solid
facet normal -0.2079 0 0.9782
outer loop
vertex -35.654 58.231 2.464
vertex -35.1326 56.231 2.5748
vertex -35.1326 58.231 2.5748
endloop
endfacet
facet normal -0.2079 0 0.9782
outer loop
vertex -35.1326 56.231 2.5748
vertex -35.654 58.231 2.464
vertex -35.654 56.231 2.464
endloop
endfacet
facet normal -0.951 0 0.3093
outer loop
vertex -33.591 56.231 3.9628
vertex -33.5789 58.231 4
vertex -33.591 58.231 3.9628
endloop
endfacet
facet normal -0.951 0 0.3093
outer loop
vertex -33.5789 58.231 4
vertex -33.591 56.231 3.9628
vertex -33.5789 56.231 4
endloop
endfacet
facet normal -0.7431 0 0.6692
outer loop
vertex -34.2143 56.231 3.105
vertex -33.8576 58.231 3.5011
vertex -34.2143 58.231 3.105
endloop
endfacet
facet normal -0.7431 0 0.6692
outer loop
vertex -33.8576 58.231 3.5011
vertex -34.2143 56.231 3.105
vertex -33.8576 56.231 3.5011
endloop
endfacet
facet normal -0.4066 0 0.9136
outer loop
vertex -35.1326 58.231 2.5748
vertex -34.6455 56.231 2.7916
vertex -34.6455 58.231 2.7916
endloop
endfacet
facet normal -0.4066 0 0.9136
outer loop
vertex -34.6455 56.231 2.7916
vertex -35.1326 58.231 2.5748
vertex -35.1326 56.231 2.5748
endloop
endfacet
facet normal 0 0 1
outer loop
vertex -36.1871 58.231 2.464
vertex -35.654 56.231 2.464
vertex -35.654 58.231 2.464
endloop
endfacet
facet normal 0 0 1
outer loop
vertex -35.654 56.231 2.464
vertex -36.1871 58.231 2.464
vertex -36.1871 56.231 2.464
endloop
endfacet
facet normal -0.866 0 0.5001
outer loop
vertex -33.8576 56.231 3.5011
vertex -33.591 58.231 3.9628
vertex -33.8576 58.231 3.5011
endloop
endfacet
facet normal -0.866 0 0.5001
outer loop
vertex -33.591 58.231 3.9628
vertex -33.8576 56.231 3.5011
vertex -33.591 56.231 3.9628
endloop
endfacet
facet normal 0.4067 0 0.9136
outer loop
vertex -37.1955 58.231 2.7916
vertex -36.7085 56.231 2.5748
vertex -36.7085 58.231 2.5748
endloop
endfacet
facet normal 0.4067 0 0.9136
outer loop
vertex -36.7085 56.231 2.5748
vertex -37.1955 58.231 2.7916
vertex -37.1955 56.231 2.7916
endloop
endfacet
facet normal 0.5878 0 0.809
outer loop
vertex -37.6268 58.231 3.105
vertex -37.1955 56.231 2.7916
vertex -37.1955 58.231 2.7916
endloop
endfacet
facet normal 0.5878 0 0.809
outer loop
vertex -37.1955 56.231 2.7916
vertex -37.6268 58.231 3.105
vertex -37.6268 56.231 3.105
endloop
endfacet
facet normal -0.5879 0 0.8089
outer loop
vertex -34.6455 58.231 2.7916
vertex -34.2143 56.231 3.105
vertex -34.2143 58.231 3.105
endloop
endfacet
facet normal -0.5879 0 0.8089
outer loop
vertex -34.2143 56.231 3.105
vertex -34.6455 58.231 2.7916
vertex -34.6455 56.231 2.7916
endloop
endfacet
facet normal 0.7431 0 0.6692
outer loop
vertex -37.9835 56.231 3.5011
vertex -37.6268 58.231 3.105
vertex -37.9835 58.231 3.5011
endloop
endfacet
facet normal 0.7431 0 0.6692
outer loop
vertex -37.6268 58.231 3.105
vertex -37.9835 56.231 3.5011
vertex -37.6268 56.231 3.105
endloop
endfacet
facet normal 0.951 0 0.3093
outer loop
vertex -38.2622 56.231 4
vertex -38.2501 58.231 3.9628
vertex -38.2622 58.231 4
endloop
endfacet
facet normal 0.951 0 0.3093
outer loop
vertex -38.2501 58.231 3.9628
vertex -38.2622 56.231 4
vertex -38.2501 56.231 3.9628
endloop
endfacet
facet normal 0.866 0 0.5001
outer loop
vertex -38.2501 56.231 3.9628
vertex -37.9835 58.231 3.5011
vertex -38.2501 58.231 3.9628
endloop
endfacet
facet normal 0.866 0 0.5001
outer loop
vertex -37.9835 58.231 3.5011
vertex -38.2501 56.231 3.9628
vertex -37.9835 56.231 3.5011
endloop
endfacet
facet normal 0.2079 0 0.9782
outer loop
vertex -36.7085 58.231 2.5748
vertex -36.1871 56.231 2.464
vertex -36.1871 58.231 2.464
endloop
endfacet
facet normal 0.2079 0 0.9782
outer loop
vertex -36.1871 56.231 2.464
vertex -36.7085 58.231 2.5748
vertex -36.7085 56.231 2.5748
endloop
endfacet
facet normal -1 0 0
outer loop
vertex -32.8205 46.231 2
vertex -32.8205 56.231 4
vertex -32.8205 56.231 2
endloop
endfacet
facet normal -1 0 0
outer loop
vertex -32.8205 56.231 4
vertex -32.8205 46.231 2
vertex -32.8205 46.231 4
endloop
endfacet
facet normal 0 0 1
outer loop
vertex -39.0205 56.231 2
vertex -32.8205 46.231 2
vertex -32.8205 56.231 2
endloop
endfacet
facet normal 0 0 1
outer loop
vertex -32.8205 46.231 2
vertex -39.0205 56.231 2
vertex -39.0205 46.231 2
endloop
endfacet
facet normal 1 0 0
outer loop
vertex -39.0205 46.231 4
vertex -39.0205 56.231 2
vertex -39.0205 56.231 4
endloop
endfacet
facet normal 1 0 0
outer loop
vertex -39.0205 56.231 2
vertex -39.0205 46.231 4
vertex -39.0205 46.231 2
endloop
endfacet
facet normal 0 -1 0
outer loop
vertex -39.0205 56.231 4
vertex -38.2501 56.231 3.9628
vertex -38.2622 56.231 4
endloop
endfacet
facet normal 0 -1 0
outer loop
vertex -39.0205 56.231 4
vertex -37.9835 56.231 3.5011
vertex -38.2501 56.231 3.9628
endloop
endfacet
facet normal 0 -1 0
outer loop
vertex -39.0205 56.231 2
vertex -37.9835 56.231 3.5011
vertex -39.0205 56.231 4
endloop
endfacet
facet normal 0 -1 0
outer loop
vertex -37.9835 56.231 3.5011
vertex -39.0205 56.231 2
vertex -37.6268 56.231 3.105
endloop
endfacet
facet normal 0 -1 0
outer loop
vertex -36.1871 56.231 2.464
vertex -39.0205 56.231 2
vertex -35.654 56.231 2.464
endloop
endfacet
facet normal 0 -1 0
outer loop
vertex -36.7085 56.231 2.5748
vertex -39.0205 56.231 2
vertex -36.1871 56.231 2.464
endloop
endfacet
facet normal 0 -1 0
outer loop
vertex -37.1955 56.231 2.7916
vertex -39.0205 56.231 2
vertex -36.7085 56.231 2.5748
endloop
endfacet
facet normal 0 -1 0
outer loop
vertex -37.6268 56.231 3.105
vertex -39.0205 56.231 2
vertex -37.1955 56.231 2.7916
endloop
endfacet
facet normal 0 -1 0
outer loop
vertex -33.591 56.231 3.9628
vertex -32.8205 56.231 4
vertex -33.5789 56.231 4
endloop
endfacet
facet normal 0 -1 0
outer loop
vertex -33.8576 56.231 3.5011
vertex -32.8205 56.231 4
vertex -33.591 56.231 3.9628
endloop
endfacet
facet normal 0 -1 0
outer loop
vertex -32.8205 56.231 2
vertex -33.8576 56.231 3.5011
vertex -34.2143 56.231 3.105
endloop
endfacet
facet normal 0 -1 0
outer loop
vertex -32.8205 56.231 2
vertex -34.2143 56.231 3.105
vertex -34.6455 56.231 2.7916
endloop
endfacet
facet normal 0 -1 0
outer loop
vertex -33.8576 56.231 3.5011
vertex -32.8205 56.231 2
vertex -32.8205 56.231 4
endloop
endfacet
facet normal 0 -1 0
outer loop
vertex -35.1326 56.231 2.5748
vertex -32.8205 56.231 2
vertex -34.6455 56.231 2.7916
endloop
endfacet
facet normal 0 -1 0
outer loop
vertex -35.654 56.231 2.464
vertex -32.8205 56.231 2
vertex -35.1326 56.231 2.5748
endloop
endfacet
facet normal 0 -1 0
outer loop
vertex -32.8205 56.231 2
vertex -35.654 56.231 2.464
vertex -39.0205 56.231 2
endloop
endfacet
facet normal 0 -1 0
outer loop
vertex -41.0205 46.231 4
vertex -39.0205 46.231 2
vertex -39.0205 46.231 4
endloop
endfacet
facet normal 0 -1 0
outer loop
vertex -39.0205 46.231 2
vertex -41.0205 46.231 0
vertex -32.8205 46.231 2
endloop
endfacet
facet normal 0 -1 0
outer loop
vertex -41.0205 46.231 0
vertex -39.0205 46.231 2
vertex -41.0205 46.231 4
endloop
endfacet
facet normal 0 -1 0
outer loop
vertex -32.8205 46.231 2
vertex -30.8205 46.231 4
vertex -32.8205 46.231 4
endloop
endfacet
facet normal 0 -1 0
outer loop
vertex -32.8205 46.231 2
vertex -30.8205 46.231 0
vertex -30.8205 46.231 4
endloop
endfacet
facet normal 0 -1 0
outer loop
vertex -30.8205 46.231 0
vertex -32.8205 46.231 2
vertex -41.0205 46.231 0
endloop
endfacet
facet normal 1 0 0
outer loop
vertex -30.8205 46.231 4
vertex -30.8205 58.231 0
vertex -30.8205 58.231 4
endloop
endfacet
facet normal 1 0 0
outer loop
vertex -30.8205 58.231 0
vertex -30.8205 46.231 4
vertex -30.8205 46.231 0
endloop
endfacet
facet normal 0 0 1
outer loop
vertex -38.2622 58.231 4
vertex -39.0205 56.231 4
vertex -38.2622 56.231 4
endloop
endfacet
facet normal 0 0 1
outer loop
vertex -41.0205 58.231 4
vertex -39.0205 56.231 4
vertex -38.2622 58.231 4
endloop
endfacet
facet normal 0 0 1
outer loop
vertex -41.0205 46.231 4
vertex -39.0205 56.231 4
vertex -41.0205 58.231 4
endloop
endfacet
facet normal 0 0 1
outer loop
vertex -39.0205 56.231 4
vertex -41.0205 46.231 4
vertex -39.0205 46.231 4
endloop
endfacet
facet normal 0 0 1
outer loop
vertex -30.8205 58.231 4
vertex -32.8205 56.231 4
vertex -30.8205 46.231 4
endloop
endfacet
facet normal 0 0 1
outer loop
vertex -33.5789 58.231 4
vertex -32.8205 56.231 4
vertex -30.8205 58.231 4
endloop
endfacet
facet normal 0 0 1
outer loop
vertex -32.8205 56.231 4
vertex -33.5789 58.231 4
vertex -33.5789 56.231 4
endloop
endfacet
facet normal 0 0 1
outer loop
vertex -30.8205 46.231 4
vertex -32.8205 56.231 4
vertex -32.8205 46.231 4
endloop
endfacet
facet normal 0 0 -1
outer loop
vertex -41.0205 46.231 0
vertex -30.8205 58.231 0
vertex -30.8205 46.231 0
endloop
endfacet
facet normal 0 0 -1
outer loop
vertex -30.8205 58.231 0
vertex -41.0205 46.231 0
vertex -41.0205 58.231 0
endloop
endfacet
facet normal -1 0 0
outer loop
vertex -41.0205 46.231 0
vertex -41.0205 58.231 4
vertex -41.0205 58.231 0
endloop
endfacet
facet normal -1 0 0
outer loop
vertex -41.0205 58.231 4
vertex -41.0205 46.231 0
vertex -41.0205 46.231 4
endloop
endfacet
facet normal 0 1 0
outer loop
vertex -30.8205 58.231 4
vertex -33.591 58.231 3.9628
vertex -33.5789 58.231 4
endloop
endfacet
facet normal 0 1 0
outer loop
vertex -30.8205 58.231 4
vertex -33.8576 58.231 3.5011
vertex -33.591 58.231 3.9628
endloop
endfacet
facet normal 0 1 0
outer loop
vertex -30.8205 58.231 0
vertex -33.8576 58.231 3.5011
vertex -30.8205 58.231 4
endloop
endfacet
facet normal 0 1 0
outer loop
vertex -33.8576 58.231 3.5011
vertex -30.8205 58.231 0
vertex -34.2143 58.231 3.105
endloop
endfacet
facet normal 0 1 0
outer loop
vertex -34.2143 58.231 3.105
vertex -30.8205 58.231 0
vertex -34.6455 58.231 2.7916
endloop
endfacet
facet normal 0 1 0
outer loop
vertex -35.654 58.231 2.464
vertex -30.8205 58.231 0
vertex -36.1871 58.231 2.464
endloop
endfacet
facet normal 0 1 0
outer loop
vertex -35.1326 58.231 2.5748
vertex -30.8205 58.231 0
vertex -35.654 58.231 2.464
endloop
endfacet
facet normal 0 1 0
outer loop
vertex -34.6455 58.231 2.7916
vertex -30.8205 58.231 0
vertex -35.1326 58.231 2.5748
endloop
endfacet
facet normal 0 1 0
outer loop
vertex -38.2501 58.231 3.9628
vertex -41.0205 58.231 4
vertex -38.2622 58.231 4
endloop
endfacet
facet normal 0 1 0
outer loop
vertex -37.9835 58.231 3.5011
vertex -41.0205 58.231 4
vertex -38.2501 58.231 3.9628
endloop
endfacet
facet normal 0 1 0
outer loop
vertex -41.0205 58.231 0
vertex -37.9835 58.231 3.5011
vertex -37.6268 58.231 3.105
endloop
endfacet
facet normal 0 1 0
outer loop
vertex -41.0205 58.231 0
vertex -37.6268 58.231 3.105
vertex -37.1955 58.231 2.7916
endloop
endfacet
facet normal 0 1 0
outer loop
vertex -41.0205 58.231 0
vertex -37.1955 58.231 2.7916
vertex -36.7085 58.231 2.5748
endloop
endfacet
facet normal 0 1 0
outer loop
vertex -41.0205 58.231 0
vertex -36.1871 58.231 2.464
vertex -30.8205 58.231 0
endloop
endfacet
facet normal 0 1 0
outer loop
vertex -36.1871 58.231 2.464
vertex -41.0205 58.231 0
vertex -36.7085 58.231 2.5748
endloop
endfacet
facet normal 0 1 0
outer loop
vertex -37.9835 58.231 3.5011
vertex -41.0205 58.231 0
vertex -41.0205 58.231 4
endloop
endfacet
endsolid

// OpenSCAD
difference () {
  union () {
    translate ([-35.92054848522025, 52.23095847724041, 2]) {
      cube ([10.2, 12, 4], center=true);
    }
  }
  union () {
    translate ([-35.92054848522025, 58.23095847724041, 5]) {
      rotate (a=90.0, v=[1, 0, 0]) {
        cylinder ($fn=30, h=20, r=2.55, center=true);
      }
    }
    translate ([-35.92054848522025, 51.23095847724041, 5]) {
      cube ([6.2, 10, 6], center=true);
    }
  }
}
